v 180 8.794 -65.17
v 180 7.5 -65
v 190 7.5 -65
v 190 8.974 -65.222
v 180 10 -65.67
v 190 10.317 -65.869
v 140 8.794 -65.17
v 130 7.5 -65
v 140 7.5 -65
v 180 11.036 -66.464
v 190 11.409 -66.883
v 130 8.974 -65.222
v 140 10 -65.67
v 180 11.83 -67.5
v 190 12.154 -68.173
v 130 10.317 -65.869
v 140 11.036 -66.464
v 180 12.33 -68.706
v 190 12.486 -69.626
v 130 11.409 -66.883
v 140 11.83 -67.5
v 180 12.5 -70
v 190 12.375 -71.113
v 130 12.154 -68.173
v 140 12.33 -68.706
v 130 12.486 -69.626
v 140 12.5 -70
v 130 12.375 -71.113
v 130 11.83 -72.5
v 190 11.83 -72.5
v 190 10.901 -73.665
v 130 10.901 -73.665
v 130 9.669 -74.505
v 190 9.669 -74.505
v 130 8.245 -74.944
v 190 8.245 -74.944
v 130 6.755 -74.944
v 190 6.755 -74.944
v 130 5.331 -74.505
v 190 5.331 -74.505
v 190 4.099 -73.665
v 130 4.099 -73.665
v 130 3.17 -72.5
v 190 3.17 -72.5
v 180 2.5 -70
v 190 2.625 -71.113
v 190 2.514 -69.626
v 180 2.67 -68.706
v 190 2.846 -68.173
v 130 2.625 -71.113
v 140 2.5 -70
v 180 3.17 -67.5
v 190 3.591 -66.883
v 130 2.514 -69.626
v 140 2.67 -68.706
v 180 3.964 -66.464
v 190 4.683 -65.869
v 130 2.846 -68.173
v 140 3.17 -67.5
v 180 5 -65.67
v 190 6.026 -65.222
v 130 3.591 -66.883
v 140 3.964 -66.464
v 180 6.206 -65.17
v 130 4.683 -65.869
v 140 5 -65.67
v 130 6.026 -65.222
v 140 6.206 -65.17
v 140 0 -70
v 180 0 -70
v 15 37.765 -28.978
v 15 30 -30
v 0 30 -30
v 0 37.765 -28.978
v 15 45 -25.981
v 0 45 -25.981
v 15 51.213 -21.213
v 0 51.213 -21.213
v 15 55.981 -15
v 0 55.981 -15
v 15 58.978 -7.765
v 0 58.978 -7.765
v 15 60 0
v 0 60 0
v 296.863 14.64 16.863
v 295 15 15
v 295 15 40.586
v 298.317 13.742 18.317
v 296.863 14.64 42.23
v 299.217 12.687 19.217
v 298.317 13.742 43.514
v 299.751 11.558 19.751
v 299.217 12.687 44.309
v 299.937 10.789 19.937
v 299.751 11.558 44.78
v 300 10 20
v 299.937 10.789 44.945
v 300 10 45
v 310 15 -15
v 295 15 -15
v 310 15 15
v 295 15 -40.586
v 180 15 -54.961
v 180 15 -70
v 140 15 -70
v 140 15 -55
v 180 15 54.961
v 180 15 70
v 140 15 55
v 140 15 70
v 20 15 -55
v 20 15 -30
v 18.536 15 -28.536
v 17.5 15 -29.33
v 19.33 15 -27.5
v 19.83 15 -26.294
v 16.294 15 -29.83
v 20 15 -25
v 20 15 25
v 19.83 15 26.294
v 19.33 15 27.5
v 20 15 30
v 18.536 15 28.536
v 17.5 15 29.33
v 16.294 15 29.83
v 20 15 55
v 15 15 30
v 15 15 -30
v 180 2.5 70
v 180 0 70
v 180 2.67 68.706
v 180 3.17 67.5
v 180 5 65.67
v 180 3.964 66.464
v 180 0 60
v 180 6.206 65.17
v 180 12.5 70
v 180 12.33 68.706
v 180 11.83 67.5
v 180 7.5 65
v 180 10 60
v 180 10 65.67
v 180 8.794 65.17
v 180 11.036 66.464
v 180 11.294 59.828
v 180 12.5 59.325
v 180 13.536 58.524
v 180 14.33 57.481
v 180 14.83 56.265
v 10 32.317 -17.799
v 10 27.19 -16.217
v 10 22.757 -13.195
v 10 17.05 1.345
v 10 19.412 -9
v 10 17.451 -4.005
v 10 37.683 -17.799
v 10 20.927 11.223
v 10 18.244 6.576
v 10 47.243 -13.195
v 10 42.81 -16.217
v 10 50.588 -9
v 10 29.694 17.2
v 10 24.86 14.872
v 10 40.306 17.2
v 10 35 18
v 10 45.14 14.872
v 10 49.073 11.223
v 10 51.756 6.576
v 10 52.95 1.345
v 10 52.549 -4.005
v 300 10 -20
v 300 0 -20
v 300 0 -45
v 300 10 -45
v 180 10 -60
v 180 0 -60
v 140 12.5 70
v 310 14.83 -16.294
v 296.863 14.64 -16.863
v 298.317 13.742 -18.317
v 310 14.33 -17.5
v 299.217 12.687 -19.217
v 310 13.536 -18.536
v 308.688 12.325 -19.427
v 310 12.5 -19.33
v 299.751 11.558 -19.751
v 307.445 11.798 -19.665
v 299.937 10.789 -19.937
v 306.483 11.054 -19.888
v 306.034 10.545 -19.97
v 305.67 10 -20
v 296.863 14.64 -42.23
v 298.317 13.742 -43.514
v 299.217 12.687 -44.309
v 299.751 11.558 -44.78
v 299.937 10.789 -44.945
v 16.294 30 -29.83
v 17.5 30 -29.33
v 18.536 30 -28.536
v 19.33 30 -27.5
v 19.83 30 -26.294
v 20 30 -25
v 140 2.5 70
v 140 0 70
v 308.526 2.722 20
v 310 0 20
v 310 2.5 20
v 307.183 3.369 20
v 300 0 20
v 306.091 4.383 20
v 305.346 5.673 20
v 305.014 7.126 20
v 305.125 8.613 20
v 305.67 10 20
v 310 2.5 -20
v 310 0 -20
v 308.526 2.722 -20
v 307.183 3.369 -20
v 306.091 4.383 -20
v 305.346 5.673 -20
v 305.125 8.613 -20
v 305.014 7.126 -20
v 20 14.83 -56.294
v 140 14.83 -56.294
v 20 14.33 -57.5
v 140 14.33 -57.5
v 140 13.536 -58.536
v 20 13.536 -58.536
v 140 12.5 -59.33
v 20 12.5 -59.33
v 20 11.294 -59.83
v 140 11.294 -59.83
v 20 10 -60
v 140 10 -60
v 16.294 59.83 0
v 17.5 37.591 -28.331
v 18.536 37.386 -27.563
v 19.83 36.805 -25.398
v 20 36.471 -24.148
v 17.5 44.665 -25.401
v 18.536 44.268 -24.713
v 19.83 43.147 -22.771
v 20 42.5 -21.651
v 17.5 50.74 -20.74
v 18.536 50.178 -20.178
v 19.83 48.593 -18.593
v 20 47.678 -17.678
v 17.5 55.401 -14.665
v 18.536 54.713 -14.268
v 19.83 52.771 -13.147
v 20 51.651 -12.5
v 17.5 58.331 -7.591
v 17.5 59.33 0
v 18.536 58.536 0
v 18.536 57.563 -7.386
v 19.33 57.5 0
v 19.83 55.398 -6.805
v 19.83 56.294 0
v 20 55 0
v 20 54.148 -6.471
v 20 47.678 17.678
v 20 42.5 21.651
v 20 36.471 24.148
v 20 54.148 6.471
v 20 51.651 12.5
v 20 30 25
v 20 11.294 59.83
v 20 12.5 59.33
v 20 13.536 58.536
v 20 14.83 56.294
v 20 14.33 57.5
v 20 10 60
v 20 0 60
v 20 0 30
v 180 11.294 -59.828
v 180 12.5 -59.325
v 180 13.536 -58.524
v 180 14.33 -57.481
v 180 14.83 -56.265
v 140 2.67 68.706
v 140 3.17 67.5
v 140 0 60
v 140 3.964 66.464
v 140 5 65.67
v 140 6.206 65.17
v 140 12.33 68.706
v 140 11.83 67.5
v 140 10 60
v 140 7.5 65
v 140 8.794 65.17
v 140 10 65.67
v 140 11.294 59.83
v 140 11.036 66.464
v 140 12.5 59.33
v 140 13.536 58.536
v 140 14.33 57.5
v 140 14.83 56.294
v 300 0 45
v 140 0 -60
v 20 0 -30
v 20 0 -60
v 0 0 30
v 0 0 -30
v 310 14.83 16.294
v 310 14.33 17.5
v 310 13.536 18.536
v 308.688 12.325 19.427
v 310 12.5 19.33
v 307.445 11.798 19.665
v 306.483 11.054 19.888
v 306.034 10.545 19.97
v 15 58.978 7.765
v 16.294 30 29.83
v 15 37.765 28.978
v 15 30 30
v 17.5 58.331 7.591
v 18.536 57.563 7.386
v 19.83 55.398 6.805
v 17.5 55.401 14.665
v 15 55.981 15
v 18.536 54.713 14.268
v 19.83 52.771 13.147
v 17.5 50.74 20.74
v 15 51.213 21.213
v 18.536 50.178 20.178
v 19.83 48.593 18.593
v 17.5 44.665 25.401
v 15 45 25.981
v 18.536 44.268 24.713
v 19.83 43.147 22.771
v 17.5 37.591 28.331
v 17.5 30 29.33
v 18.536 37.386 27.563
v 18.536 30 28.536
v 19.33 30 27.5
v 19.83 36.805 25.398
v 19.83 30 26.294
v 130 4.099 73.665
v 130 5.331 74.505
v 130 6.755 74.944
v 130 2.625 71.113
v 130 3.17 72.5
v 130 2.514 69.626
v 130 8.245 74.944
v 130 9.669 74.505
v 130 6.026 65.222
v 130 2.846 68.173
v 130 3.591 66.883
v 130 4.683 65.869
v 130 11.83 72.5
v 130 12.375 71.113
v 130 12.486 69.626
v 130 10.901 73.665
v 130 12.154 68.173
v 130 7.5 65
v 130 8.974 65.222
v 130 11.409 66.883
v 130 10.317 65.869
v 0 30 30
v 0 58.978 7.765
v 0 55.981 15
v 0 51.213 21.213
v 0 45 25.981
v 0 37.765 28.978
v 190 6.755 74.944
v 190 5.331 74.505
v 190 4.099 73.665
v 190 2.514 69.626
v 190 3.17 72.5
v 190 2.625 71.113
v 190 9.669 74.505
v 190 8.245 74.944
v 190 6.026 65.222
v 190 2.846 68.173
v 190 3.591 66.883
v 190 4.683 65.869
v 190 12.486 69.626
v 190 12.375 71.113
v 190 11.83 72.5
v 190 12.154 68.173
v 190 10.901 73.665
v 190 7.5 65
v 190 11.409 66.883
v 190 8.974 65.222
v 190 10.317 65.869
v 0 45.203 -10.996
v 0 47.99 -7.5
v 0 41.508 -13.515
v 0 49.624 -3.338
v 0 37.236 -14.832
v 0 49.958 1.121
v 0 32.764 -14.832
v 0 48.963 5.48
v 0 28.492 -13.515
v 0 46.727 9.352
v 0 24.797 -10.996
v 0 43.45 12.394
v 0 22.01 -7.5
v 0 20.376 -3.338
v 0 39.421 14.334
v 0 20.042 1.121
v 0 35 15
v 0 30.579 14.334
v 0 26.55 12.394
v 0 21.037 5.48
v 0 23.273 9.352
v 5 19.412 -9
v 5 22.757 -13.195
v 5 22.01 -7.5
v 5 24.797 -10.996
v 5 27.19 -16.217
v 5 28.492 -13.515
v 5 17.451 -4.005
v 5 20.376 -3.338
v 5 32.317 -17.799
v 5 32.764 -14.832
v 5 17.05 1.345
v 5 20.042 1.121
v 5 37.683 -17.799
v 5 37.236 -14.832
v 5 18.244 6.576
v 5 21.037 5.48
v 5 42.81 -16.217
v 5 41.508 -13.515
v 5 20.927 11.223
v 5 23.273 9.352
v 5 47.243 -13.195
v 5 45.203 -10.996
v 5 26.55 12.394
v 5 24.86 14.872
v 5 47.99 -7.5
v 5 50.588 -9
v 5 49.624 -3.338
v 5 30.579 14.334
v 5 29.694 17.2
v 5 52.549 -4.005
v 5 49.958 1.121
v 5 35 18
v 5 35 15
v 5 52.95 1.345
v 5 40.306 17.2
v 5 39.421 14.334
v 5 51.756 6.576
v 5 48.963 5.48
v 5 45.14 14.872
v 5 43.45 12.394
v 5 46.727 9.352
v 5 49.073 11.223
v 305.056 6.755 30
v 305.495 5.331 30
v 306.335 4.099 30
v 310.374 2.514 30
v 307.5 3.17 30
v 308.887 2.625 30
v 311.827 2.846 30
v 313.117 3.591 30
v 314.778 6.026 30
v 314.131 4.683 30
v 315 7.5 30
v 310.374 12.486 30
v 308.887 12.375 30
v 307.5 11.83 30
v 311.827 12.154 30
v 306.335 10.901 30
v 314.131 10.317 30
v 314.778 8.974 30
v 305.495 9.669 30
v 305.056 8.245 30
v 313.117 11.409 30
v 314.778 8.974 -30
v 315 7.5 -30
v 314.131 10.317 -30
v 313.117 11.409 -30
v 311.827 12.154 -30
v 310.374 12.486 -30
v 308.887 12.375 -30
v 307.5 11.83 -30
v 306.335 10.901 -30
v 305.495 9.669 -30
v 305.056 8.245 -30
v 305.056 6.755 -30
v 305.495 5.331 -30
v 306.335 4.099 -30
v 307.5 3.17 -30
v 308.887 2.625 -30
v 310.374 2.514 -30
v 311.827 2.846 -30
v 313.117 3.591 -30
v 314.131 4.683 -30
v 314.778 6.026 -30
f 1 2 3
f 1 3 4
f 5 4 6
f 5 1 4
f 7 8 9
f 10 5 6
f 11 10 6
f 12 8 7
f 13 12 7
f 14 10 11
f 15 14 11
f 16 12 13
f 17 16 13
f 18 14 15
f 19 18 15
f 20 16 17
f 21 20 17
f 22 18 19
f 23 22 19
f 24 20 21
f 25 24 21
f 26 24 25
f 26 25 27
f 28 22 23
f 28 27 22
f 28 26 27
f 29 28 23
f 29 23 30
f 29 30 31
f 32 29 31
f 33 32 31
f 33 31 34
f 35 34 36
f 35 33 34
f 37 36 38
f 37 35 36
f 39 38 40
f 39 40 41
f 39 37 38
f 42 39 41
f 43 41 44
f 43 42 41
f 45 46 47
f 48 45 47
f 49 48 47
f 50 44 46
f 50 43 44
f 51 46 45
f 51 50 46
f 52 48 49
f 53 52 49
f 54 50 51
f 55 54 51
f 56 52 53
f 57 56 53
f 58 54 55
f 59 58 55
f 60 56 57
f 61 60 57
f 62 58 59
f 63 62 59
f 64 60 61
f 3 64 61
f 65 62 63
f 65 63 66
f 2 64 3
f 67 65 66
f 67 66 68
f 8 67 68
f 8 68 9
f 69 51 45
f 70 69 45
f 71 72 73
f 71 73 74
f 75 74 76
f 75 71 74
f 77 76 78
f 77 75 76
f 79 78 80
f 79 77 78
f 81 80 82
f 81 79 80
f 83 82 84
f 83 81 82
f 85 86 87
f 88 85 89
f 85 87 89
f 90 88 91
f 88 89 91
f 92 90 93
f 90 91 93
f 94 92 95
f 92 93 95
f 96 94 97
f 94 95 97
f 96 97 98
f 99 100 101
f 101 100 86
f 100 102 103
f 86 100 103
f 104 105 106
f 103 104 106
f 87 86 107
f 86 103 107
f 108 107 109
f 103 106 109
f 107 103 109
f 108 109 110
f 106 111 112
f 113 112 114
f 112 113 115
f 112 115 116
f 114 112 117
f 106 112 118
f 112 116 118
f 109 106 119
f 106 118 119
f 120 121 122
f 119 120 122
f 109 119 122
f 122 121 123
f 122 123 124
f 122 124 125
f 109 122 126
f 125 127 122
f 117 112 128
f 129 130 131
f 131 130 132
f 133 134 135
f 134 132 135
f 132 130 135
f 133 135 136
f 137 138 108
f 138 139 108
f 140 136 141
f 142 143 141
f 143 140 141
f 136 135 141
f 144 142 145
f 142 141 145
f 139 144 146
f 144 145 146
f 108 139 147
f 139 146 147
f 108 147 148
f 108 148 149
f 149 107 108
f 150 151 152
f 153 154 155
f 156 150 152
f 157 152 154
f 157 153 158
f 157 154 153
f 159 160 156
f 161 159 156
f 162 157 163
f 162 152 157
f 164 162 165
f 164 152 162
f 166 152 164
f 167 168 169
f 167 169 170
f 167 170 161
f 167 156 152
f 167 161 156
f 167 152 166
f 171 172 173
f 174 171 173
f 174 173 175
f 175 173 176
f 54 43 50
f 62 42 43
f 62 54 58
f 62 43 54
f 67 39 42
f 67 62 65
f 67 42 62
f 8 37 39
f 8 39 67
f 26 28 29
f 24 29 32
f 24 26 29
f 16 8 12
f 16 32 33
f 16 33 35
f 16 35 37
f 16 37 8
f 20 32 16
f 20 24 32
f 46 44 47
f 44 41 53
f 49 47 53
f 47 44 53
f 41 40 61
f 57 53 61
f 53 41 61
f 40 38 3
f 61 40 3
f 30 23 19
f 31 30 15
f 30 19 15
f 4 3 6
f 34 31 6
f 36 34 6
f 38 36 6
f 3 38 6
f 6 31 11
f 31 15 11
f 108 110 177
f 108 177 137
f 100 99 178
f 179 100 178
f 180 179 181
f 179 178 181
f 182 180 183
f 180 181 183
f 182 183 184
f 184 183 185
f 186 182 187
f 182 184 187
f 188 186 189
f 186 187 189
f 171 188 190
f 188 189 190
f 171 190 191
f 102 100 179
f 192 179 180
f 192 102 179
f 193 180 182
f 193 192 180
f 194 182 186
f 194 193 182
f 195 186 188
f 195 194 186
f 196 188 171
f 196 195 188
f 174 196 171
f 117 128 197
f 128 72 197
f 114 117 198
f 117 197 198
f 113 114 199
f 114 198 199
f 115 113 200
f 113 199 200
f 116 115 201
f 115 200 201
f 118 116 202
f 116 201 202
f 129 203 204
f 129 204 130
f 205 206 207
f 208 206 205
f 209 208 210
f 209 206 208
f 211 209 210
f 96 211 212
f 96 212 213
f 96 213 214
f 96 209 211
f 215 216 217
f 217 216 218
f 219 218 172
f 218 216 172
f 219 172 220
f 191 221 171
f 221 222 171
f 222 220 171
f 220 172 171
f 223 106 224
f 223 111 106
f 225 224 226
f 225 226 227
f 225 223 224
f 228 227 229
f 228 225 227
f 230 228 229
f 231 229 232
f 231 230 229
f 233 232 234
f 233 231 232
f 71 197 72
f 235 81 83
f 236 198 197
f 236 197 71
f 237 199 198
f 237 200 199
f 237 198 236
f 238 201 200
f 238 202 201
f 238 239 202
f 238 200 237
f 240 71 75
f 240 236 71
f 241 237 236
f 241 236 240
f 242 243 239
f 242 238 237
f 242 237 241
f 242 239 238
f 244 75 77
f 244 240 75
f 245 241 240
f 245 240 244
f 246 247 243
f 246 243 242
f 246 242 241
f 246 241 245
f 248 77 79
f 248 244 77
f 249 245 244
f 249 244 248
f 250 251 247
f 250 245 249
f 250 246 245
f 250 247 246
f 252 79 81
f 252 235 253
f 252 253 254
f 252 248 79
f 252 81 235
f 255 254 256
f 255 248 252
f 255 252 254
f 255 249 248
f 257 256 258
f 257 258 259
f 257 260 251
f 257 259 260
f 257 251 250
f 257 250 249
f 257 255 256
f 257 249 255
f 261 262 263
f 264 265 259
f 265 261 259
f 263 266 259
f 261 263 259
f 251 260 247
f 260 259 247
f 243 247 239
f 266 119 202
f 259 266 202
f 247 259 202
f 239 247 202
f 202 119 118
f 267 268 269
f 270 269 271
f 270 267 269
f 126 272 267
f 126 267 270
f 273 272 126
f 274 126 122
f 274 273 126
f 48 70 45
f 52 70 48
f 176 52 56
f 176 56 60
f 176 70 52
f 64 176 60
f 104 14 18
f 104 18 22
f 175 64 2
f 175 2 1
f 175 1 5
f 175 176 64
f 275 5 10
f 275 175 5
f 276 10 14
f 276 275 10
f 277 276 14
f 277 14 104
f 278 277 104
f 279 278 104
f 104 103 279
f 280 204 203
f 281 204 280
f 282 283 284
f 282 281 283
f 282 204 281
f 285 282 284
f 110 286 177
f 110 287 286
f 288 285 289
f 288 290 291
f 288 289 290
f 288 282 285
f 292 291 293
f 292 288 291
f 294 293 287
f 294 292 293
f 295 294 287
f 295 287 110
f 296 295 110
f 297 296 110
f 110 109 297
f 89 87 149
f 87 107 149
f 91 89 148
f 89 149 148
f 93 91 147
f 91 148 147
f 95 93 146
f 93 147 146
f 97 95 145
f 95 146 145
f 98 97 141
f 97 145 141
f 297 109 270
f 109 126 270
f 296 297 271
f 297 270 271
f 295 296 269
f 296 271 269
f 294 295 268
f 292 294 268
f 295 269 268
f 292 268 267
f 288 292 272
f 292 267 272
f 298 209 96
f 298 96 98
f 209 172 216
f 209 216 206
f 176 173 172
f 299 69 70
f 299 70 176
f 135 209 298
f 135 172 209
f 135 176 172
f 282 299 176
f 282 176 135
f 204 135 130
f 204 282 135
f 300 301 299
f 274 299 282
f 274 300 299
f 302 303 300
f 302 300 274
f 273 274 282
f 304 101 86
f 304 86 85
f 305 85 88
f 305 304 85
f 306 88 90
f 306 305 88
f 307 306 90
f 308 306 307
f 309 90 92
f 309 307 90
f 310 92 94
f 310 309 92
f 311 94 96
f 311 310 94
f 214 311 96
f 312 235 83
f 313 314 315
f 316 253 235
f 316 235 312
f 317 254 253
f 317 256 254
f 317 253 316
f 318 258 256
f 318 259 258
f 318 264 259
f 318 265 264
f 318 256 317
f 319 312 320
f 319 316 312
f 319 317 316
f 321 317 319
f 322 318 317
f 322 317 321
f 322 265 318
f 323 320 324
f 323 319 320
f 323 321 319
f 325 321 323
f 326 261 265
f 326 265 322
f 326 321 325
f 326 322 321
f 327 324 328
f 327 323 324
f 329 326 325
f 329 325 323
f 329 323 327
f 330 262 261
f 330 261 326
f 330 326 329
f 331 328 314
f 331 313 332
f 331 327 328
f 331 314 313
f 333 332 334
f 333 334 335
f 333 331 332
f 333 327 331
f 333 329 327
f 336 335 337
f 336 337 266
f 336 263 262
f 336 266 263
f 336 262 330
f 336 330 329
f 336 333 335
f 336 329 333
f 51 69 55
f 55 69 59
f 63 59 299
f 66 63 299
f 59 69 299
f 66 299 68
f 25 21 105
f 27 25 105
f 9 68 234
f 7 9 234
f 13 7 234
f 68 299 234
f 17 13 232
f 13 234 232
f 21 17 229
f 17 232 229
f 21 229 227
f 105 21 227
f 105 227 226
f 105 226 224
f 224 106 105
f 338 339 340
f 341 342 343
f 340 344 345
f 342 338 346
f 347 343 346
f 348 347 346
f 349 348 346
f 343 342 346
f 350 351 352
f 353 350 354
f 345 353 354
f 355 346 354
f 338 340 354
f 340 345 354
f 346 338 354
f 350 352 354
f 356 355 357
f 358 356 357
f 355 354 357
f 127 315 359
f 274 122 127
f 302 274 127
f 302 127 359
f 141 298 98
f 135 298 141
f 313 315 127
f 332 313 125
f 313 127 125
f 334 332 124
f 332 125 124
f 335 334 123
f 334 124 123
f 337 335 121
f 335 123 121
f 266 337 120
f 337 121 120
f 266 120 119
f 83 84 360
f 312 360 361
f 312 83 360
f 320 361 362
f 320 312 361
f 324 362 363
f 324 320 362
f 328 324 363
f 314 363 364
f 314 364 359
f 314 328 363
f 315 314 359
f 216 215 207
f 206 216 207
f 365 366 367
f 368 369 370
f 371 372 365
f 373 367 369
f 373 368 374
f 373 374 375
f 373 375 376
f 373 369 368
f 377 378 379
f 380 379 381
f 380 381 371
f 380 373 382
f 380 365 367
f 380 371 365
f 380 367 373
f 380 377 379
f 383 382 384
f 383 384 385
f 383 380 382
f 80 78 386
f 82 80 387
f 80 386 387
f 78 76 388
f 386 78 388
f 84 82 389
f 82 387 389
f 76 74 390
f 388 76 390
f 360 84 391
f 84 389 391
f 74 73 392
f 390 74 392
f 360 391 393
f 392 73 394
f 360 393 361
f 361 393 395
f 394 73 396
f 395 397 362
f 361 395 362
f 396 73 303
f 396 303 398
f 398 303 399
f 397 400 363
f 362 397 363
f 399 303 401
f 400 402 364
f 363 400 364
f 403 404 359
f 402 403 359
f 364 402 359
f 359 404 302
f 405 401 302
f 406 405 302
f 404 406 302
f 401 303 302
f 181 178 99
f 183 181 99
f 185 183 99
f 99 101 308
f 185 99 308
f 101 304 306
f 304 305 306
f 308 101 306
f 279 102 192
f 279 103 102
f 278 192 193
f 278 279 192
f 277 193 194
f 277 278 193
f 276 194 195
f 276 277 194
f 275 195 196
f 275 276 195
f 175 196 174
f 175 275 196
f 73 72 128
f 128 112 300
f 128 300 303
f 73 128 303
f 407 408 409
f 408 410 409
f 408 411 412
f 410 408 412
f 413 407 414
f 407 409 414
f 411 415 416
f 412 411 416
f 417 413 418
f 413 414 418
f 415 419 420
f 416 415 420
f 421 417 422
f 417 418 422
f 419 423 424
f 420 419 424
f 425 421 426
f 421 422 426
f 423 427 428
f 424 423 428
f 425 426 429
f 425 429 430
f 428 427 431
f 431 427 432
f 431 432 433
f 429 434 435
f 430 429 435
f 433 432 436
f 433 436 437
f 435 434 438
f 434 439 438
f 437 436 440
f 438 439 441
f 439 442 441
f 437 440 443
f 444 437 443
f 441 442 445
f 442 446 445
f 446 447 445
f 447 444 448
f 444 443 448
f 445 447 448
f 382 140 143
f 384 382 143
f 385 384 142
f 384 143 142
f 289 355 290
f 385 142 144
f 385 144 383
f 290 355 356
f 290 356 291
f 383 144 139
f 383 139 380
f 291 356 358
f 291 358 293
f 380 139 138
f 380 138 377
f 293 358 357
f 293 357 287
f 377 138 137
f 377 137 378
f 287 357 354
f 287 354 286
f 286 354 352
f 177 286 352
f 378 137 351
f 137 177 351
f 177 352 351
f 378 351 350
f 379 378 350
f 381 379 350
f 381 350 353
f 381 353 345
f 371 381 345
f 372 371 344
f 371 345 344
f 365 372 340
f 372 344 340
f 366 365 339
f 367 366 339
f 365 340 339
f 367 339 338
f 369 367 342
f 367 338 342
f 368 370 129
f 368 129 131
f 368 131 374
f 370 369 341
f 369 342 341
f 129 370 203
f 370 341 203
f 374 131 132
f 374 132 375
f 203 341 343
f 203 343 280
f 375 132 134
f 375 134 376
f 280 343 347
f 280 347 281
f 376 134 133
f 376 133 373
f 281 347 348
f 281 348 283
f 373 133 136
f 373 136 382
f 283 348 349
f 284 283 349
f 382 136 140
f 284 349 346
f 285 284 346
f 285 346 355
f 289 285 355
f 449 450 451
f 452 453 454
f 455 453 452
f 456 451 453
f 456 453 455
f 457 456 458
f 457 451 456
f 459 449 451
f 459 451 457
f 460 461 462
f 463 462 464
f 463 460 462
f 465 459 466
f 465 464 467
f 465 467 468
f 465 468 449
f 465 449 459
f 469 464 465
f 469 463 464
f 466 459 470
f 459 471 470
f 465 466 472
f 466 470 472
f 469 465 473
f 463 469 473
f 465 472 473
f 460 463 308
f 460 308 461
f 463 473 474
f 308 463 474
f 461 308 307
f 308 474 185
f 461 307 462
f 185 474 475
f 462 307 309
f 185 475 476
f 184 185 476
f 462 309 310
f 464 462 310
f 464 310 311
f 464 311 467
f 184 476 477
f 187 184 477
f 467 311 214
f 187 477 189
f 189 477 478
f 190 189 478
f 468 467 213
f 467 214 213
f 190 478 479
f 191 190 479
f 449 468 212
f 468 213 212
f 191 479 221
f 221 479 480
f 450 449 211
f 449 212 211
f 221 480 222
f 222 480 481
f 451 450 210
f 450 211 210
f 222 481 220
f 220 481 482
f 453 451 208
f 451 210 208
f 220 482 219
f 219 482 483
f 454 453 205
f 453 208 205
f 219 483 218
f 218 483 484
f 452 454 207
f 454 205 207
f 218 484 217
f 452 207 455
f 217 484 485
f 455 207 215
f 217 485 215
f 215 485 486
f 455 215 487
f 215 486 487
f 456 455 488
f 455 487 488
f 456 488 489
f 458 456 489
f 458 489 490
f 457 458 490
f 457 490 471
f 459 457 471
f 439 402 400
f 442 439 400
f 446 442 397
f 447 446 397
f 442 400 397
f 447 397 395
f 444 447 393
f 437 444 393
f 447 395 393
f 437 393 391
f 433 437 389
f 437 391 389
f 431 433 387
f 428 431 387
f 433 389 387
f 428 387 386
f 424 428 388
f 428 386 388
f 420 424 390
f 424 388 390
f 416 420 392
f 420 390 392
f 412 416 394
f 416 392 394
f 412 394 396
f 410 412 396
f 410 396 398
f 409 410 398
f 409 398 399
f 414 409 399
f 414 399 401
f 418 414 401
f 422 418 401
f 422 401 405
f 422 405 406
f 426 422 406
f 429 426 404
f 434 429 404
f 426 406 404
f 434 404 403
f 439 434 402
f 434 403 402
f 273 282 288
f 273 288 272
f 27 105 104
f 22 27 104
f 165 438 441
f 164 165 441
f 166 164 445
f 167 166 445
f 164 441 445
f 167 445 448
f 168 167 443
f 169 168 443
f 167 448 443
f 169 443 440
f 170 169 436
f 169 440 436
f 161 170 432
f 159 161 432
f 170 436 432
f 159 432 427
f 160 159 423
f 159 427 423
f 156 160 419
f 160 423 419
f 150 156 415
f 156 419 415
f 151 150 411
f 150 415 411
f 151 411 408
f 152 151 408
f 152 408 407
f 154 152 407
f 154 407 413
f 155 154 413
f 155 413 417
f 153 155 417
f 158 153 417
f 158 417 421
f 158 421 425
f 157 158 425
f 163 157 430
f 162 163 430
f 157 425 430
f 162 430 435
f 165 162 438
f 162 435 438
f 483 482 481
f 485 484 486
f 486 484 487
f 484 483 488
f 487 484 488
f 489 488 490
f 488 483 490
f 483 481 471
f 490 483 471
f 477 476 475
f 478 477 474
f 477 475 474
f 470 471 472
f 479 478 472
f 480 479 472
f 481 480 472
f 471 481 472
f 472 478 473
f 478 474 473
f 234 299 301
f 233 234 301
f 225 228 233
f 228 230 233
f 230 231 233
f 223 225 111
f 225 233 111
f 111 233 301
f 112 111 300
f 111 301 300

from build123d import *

# Parameters (mm, degrees)
BOSS_EXTRUDE2_DEPTH = 15
SKETCH3_W           = 40
SKETCH3_H           = 15
BOSS_EXTRUDE3_DEPTH = 10
BOSS_EXTRUDE4_START = -50
SKETCH4_R           = 5
BOSS_EXTRUDE4_DEPTH = 60
SKETCH5_W           = 20
SKETCH5_H           = 15
BOSS_EXTRUDE5_DEPTH = 10
BOSS_EXTRUDE6_START = -20
SKETCH6_R           = 5
BOSS_EXTRUDE6_DEPTH = 30
SKETCH7_W           = 20
SKETCH7_H           = 60
BOSS_EXTRUDE7_DEPTH = 60
SKETCH9_R           = 15
CUT_EXTRUDE1_DEPTH  = 5
SKETCH10_R          = 18
CUT_EXTRUDE2_DEPTH  = 5
FILLET1_R           = 30
FILLET2_R           = 5


with BuildPart() as part:
    # Sketch1 → Boss-Extrude2 (new body)
    with BuildSketch(Plane(origin=(0, 0, 0), x_dir=(1, 0, 0), z_dir=(0, 1, 0))):
        Polygon((0, 0), (300, 0), (300, -45), (180, -60), (20, -60), (20, -30), (0, -30), align=None)
    boss_extrude2 = extrude(amount=BOSS_EXTRUDE2_DEPTH)

    # Sketch3 → Boss-Extrude3 (add)
    with BuildSketch(Plane.XY.offset(60)):
        with Locations((160, 7.5)):
            Rectangle(SKETCH3_W, SKETCH3_H)
    boss_extrude3 = extrude(amount=BOSS_EXTRUDE3_DEPTH)

    # Sketch4 → Boss-Extrude4 (add)
    with BuildSketch(Plane(origin=(180, 0, 0), x_dir=(0, 0, -1), z_dir=(1, 0, 0)).offset(BOSS_EXTRUDE4_START)):
        with Locations((-70, 7.5)):
            Circle(SKETCH4_R)
    boss_extrude4 = extrude(amount=BOSS_EXTRUDE4_DEPTH)

    # Sketch5 → Boss-Extrude5 (add)
    with BuildSketch(Plane(origin=(300, 0, 0), x_dir=(0, 0, -1), z_dir=(1, 0, 0))):
        with Locations((-10, 7.5)):
            Rectangle(SKETCH5_W, SKETCH5_H)
    boss_extrude5 = extrude(amount=BOSS_EXTRUDE5_DEPTH)

    # Sketch6 → Boss-Extrude6 (add)
    with BuildSketch(Plane.XY.offset(20).offset(BOSS_EXTRUDE6_START)):
        with Locations((310, 7.5)):
            Circle(SKETCH6_R)
    boss_extrude6 = extrude(amount=BOSS_EXTRUDE6_DEPTH)

    # Mirror1: Boss-Extrude2, Boss-Extrude3, Boss-Extrude4, Boss-Extrude5, Boss-Extrude6 across plane
    add(boss_extrude2.mirror(Plane(origin=(0, 15, 0), x_dir=(1, 0, 0), z_dir=(0, 0, 1))))
    add(boss_extrude3.mirror(Plane(origin=(0, 15, 0), x_dir=(1, 0, 0), z_dir=(0, 0, 1))))
    add(boss_extrude4.mirror(Plane(origin=(0, 15, 0), x_dir=(1, 0, 0), z_dir=(0, 0, 1))))
    add(boss_extrude5.mirror(Plane(origin=(0, 15, 0), x_dir=(1, 0, 0), z_dir=(0, 0, 1))))
    add(boss_extrude6.mirror(Plane(origin=(0, 15, 0), x_dir=(1, 0, 0), z_dir=(0, 0, 1))))

    # Sketch7 → Boss-Extrude7 (add)
    with BuildSketch(Plane(origin=(0, 0, 0), x_dir=(1, 0, 0), z_dir=(0, 1, 0))):
        with Locations((10, 0)):
            Rectangle(SKETCH7_W, SKETCH7_H)
    extrude(amount=BOSS_EXTRUDE7_DEPTH)

    # Sketch9 → Cut-Extrude1 (cut)
    with BuildSketch(Plane.ZY):
        with Locations((0, 35)):
            Circle(SKETCH9_R)
    extrude(amount=-CUT_EXTRUDE1_DEPTH, mode=Mode.SUBTRACT)

    # Sketch10 → Cut-Extrude2 (cut)
    with BuildSketch(Plane.ZY.offset(-5)):
        with Locations((0, 35)):
            Circle(SKETCH10_R)
    extrude(amount=-CUT_EXTRUDE2_DEPTH, mode=Mode.SUBTRACT)

    # Fillet1
    fillet1_edges = [part.edges().sort_by_distance(p)[0] for p in [
        (10, 60, -30),
        (10, 60, 30),
    ]]
    fillet(fillet1_edges, radius=FILLET1_R - 0.0001)  # a hair under: the kernel refuses the full size

    # Fillet2
    fillet2_edges = [part.edges().sort_by_distance(p)[0] for p in [
        (20, 22.50005, -30),
        (20, 51.213232725, -21.213232725),
        (20, 22.50005, 30),
        (240, 15, -52.5),
        (300, 15, -32.5),
        (305, 15, -20),
        (305, 15, 20),
        (300, 15, 32.5),
        (240, 15, 52.5),
        (80, 15, -60),
        (80, 15, 60),
        (20, 51.213232725, 21.213232725),
    ]]
    fillet(fillet2_edges, radius=FILLET2_R)


solid = part.part
